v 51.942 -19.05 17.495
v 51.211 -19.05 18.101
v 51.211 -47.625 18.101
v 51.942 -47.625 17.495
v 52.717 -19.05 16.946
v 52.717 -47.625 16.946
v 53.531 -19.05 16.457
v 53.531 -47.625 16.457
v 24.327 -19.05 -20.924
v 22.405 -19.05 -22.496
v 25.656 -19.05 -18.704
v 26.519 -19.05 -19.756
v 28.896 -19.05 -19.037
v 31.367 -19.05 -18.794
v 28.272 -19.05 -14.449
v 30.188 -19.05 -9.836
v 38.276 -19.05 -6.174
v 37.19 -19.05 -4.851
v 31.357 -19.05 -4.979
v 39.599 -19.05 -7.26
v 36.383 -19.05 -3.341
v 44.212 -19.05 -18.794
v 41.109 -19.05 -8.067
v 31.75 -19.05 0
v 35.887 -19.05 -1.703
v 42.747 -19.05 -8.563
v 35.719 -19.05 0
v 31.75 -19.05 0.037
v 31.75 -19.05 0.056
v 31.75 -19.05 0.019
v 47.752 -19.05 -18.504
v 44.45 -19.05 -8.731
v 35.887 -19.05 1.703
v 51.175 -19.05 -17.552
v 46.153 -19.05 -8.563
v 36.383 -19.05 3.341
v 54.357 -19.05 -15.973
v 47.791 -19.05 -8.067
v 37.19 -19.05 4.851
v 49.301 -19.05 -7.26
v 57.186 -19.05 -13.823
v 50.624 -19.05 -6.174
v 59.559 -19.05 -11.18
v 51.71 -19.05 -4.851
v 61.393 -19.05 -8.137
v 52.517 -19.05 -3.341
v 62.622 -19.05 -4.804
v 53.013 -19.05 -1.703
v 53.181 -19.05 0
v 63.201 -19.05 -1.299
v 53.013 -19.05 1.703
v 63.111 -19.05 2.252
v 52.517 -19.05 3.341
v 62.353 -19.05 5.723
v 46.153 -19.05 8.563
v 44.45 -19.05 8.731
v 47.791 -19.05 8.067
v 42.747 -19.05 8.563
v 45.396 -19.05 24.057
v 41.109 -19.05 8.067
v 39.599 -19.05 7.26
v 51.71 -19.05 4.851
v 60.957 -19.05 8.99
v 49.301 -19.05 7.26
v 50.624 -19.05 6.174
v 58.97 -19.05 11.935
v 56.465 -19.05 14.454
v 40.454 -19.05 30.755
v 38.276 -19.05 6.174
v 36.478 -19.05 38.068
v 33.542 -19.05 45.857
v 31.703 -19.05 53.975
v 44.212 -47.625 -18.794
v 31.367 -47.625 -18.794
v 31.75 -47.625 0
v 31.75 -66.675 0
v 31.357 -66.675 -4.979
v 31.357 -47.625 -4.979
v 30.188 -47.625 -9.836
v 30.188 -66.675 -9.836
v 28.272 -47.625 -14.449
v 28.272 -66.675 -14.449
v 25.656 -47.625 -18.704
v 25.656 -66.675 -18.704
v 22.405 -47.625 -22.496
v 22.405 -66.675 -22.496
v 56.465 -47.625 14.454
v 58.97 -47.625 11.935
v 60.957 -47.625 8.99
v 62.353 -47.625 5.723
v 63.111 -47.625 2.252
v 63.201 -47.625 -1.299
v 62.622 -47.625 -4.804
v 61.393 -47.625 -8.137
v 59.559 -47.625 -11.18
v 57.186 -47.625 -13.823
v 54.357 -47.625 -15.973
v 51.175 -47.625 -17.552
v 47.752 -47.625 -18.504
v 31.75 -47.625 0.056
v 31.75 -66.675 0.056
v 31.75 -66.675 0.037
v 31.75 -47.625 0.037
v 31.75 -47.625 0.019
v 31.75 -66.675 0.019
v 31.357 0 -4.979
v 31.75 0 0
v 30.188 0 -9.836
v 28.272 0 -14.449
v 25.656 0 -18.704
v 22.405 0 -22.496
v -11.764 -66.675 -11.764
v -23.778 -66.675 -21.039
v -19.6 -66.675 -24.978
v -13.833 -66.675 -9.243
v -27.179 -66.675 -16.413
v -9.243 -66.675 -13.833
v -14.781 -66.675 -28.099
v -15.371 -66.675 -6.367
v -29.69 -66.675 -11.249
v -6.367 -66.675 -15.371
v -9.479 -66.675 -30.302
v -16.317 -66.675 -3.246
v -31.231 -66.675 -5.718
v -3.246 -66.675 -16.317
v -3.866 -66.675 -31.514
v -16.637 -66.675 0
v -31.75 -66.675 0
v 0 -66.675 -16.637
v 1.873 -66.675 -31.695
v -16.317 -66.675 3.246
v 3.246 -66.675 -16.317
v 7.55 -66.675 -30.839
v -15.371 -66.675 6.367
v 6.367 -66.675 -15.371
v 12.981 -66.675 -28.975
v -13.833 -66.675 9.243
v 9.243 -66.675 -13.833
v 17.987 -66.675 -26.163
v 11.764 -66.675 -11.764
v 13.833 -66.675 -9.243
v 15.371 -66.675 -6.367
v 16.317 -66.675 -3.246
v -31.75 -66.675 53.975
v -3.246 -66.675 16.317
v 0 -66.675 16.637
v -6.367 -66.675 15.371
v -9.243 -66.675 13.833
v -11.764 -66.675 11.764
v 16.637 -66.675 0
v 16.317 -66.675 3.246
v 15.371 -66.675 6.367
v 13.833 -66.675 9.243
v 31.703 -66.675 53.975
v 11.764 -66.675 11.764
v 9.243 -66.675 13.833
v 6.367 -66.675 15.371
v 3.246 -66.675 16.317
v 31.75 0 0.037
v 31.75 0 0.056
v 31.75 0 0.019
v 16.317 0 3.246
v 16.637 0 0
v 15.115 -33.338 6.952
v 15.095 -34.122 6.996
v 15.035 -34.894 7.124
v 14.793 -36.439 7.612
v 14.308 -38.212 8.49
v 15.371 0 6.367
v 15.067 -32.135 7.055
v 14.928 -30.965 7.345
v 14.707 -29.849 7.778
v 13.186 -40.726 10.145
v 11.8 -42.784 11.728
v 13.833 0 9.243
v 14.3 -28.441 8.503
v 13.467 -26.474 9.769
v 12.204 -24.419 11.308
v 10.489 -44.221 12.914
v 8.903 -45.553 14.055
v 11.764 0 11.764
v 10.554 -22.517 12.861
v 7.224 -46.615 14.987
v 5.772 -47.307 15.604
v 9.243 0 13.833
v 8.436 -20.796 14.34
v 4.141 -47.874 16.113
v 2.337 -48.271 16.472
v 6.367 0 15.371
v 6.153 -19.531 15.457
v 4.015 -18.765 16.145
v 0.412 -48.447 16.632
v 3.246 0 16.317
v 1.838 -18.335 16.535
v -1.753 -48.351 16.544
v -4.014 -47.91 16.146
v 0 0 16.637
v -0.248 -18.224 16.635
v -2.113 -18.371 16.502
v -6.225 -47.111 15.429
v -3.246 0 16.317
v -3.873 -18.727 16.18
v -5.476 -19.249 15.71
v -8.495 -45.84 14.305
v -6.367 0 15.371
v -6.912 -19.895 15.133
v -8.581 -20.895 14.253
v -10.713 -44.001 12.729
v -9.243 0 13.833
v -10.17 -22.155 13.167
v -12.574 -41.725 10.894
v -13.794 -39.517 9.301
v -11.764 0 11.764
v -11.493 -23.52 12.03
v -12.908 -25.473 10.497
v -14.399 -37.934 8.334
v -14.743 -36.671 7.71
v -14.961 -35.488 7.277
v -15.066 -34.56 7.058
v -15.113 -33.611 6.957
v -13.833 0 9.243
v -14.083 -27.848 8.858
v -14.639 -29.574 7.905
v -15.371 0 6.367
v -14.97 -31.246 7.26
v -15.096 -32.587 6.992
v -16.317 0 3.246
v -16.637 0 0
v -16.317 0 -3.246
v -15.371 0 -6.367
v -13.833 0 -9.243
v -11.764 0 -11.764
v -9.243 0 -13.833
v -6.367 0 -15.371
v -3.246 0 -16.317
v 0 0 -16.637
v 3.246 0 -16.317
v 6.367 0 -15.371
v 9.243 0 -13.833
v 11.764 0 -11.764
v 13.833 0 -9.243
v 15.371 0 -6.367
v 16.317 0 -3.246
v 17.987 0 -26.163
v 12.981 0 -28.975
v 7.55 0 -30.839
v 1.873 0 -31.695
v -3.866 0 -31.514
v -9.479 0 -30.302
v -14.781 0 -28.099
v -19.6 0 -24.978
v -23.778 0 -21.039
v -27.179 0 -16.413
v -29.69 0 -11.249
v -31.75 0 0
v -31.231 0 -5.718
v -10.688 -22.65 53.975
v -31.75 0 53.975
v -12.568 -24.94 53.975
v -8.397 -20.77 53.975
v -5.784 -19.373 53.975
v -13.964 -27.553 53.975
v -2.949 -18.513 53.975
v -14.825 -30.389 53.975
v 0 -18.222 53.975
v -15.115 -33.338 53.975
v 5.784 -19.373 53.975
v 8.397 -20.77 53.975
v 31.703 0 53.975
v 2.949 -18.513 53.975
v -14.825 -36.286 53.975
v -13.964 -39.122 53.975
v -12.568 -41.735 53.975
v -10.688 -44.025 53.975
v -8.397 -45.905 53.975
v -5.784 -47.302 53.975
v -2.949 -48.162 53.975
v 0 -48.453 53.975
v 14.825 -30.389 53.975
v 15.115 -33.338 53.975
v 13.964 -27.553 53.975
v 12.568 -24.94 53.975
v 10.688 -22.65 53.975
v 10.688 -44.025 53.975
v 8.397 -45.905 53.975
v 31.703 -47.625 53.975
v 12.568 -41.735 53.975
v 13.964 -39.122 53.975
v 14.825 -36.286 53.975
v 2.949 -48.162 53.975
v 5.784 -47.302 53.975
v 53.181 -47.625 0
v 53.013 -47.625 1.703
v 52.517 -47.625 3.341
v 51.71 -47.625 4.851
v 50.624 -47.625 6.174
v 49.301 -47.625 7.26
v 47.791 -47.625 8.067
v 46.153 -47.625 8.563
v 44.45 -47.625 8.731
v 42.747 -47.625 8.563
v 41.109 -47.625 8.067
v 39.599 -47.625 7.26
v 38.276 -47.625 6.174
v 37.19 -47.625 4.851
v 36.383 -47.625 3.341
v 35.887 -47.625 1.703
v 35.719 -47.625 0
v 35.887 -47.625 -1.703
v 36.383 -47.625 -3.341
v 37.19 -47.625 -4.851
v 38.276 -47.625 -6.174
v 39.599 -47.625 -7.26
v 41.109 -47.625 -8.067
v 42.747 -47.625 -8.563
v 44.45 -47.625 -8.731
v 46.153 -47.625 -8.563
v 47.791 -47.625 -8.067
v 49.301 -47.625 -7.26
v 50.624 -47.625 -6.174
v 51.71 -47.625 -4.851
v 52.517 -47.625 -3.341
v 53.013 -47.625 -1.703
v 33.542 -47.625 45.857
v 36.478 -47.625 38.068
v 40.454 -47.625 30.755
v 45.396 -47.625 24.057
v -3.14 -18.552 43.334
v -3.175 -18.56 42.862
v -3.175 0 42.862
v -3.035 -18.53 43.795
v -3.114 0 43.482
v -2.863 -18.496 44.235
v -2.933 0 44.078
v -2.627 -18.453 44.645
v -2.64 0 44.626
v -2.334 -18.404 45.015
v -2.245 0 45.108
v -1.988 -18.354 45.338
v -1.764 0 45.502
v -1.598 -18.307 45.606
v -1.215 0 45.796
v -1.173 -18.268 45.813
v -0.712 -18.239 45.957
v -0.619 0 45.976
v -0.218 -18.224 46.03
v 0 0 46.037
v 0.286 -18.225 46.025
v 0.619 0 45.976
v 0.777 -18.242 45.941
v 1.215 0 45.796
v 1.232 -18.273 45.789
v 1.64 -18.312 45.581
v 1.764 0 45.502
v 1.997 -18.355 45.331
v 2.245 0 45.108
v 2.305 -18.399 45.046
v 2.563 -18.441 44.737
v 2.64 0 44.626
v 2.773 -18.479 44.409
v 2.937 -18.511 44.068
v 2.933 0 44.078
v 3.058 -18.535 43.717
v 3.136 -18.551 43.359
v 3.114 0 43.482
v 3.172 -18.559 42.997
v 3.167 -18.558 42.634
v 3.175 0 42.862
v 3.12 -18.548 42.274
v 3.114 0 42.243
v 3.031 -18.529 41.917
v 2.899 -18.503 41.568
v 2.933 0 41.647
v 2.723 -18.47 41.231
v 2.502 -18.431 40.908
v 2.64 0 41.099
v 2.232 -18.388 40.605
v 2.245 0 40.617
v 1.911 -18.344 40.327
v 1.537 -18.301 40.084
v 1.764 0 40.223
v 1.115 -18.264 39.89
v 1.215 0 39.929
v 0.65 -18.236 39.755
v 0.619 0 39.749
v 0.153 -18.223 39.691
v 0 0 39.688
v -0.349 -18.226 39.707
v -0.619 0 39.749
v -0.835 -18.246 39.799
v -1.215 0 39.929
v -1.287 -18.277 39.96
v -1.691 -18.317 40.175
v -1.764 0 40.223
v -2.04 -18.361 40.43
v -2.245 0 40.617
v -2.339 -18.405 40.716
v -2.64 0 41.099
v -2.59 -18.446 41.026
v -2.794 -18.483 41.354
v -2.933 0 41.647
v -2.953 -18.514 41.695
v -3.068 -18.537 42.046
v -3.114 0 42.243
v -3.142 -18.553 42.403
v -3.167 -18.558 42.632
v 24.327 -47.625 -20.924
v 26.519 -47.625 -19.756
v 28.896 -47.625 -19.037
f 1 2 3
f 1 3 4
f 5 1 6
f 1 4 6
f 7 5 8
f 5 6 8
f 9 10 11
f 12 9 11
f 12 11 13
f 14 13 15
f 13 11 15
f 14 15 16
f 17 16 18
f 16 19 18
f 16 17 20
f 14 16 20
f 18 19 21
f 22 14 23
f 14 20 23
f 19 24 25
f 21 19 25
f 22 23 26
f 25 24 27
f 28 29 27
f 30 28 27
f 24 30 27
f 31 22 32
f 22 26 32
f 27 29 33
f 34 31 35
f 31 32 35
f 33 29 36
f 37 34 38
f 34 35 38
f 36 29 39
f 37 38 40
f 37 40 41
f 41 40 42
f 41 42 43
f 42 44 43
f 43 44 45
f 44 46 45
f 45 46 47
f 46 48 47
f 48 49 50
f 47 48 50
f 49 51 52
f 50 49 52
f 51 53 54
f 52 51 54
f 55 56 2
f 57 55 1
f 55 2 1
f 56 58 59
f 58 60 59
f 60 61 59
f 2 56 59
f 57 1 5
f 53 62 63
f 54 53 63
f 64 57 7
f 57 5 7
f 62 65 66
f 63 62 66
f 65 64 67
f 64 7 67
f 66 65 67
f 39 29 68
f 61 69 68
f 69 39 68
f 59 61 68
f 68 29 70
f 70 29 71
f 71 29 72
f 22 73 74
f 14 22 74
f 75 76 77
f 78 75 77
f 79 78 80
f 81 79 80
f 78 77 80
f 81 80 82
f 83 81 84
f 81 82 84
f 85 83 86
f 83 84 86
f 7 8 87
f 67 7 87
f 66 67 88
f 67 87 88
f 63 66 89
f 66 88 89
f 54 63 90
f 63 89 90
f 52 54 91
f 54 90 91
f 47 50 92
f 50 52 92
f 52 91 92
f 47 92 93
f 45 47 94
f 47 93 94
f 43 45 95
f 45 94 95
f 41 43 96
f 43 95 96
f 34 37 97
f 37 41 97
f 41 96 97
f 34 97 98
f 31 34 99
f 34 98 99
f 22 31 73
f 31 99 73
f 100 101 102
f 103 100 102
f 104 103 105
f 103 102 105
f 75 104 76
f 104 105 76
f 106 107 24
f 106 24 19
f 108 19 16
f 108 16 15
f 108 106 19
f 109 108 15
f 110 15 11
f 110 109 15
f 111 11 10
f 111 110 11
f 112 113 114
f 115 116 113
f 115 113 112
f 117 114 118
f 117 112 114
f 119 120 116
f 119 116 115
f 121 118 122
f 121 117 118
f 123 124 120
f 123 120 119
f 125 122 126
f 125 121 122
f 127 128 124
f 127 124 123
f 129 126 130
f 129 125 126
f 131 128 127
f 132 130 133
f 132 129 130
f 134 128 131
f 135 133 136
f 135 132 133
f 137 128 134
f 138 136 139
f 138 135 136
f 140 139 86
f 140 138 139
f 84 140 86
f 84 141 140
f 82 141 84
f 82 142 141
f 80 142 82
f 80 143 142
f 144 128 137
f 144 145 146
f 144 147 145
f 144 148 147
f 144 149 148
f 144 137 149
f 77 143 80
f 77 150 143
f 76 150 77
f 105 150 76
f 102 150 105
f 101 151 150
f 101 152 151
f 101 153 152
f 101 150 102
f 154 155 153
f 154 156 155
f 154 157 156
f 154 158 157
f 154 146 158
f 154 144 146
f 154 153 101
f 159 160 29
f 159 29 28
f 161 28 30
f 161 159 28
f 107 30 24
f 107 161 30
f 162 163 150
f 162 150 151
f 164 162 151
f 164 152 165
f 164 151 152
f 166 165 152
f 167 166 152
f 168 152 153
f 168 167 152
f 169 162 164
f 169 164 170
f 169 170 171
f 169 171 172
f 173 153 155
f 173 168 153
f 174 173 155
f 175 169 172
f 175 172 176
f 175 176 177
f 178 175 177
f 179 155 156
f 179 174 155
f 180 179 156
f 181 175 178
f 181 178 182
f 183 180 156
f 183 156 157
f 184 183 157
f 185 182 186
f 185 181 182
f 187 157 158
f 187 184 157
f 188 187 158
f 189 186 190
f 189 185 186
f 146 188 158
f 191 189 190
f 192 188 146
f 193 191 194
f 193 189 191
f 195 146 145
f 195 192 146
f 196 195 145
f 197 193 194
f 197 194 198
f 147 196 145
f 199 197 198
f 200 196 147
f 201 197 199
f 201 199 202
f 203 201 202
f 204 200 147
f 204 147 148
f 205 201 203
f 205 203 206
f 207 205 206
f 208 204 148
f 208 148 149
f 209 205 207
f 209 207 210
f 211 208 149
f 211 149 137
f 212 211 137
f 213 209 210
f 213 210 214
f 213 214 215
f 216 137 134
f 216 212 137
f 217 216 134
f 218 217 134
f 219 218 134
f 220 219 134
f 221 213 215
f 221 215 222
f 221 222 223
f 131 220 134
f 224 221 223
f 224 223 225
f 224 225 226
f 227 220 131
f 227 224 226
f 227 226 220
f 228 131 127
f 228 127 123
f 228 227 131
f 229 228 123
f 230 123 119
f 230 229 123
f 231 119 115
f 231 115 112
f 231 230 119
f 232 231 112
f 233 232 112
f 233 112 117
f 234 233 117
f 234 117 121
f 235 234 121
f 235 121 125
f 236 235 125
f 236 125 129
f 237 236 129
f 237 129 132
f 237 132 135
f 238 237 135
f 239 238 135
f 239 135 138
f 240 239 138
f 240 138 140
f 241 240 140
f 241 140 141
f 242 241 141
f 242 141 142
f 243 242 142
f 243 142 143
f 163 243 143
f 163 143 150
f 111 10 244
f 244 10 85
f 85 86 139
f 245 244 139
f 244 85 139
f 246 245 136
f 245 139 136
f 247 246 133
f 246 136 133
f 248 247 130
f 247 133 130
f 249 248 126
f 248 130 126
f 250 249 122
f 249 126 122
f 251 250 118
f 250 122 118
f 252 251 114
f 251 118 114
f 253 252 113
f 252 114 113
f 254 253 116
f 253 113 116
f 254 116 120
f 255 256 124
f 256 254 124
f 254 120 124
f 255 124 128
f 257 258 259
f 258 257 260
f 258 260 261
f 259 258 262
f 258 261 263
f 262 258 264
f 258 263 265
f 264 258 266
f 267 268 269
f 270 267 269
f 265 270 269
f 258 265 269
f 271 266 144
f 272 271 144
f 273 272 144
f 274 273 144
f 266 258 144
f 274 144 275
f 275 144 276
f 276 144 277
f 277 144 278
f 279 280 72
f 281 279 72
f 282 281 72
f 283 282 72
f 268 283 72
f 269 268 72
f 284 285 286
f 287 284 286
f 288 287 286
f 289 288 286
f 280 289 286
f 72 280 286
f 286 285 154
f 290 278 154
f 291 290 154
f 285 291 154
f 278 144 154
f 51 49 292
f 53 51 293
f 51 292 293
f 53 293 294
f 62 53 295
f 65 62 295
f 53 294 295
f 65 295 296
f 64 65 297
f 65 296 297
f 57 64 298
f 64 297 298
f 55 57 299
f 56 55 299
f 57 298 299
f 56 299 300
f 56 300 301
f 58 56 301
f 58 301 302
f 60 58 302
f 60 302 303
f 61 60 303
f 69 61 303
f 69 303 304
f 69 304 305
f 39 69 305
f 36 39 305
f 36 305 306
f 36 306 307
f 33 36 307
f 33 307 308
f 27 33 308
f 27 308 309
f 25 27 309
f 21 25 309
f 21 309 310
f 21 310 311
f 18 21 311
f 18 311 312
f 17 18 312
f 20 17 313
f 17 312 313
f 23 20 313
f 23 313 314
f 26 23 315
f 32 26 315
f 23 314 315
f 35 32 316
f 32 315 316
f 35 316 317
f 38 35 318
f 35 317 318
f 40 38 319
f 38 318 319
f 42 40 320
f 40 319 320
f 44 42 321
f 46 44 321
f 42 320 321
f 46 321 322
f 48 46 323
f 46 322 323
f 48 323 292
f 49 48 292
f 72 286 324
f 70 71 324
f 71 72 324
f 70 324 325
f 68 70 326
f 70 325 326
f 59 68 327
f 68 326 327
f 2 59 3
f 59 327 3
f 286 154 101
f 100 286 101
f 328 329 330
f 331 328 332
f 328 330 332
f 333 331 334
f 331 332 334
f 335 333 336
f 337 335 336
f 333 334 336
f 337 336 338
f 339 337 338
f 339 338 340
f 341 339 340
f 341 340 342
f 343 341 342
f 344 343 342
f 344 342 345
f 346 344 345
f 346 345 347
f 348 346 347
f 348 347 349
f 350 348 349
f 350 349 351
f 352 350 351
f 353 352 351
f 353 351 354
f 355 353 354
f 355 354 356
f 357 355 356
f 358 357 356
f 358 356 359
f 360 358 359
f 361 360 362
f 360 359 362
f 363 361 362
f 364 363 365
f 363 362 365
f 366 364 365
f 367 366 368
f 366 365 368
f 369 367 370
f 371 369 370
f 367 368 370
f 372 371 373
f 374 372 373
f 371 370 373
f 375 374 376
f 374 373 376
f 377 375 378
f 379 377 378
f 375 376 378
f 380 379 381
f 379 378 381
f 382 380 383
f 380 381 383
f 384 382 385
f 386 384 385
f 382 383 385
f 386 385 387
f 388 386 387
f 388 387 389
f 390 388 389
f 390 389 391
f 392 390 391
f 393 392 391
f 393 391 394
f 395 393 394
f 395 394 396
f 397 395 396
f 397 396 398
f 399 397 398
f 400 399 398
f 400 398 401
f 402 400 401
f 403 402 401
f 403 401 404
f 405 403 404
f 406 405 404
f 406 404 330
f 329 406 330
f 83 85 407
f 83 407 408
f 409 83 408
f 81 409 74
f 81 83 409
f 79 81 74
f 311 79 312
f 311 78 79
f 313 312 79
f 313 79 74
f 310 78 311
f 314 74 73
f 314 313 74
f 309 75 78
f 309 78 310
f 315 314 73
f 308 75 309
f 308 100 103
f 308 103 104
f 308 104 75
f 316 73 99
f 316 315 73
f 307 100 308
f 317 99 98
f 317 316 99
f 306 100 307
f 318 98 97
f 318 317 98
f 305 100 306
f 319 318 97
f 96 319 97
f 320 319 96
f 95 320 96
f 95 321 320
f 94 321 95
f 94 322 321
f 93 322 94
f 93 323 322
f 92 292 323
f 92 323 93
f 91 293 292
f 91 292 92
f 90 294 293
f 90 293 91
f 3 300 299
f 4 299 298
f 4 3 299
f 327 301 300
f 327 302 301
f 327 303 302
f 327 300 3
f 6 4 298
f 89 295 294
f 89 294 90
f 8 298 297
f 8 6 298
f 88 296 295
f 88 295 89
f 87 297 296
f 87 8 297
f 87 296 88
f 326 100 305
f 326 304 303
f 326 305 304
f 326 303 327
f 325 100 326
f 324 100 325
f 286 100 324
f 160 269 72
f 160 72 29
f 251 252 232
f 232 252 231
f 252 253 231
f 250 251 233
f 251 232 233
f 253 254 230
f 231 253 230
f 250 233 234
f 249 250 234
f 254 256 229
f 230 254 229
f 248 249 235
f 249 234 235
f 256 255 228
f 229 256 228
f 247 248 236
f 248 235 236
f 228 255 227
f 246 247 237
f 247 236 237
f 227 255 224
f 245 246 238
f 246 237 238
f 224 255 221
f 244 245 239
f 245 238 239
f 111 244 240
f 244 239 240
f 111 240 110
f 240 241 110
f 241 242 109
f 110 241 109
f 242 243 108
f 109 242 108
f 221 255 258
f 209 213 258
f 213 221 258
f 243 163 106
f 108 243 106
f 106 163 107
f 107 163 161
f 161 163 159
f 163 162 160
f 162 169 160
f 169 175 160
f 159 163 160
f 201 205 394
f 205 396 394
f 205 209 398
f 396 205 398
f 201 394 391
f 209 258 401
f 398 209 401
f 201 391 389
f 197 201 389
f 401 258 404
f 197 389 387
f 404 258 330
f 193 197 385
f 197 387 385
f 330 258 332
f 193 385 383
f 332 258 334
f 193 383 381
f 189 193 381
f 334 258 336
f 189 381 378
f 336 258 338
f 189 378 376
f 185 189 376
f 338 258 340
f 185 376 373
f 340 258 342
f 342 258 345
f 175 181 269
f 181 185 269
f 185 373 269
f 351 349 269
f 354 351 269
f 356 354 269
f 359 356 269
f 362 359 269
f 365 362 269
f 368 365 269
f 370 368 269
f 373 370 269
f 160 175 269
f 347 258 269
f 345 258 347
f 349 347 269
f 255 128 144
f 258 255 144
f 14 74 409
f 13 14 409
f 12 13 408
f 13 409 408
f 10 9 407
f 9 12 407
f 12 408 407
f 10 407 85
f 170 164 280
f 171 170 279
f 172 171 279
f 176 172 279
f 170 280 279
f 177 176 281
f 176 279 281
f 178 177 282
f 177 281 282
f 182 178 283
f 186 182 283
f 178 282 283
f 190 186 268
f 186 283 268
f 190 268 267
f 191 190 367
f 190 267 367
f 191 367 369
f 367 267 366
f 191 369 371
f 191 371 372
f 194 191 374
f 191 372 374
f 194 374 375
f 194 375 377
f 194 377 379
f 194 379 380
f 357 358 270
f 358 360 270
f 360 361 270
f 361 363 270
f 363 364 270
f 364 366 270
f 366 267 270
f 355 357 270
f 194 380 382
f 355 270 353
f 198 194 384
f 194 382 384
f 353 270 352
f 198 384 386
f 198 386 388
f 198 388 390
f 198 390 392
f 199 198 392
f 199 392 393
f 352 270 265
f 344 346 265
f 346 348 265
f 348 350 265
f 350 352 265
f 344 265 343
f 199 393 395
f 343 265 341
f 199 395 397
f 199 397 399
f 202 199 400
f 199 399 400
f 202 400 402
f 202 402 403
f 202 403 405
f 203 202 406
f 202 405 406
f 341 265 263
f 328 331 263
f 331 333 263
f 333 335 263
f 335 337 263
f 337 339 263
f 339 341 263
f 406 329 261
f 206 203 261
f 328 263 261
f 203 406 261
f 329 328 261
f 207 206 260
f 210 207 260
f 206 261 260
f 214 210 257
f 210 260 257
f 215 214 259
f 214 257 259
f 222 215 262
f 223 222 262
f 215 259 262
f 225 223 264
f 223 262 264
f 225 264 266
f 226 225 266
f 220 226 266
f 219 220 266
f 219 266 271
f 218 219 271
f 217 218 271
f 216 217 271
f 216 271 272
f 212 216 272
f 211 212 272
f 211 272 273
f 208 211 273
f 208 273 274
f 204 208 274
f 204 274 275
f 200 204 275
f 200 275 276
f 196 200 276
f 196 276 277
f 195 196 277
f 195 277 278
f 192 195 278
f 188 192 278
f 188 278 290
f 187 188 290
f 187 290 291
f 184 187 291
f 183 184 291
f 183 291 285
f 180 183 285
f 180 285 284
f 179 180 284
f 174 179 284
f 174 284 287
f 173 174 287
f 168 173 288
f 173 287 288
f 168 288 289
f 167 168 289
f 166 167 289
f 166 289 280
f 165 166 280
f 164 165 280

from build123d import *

# Parameters (mm, degrees)
F0_R      = 63.5
F0_R_2    = 16.637
F1_DEPTH  = 66.675
F2_R      = 63.5
F2_R_2    = 8.73125
F3_DEPTH  = 66.676
F4_R      = 8.73125
F5_DEPTH  = 19.05
F7_R      = 15.1150654982
F8_DEPTH  = 53.594
F9_R      = 3.175
F10_DEPTH = 25.4


# Not quite as in the source:
# - a pattern or mirror of a feature is missing from the dataset's text; its kind, count and spacing are read off the source's solid


with BuildPart() as f1:
    # F0 (on Front) → F1 (new body)
    with BuildSketch(Plane.XZ):
        Circle(F0_R)
        Circle(F0_R_2, mode=Mode.SUBTRACT)
    extrude(amount=F1_DEPTH)

    # F2 (on face) → F3 (cut, through all)
    with BuildSketch(Plane.XZ.offset(66.675)):
        Circle(F2_R)
        with BuildLine():
            Line((-31.75, 0), (-31.75, 53.975))
            Line((-31.75, 53.975), (31.7028198831, 53.975))
            ThreePointArc((31.7028198831, 53.975), (38.3398958316, 34.3431316591), (51.2105212065, 18.1009632644))
            ThreePointArc((51.2105212065, 18.1009632644), (52.3246389461, 17.2136710516), (53.5311013852, 16.4567072537))
            ThreePointArc((53.5311013852, 16.4567072537), (62.6217032006, -4.8040419219), (44.2117641598, -18.7944901416))
            Line((44.2117641598, -18.7944901416), (31.3671737764, -18.7944901416))
            ThreePointArc((31.3671737764, -18.7944901416), (26.5189786011, -19.756304441), (22.405124126, -22.4960643869))
            ThreePointArc((22.405124126, -22.4960643869), (-12.179897557, -29.3208559817), (-31.75, 0))
        make_face(mode=Mode.SUBTRACT)
        with Locations((44.45, 0)):
            Circle(F2_R_2)
    extrude(amount=-F3_DEPTH, mode=Mode.SUBTRACT)

    # F4 (on face) → F5 (cut)
    with BuildSketch(Plane.XZ.offset(66.675)):
        with BuildLine():
            Line((31.3671737764, -18.7944901416), (44.2117641598, -18.7944901416))
            ThreePointArc((44.2117641598, -18.7944901416), (62.6217032006, -4.8040419219), (53.5311013852, 16.4567072537))
            ThreePointArc((53.5311013852, 16.4567072537), (52.3246389461, 17.2136710516), (51.2105212065, 18.1009632644))
            ThreePointArc((51.2105212065, 18.1009632644), (38.3398958316, 34.3431316591), (31.7028198831, 53.975))
            Line((31.7028198831, 53.975), (31.7499514816, 0.0555059775))
            ThreePointArc((31.7499514816, 0.0555059775), (31.7499878704, 0.0277529994), (31.75, 0))
            ThreePointArc((31.75, 0), (29.3208559817, -12.179897557), (22.405124126, -22.4960643869))
            ThreePointArc((22.405124126, -22.4960643869), (26.5189786011, -19.756304441), (31.3671737764, -18.7944901416))
        make_face()
        with Locations((44.45, 0)):
            Circle(F4_R, mode=Mode.SUBTRACT)
    f5 = extrude(amount=-F5_DEPTH, mode=Mode.SUBTRACT)

    # F5_copies: F5 across plane
    add(f5.mirror(Plane.ZX.offset(-33.3375)), mode=Mode.SUBTRACT)

    # F7 (on face) → F8 (cut)
    with BuildSketch(Plane.XY.offset(53.975)):
        with Locations((0, -33.3375)):
            Circle(F7_R)
    extrude(amount=-F8_DEPTH, mode=Mode.SUBTRACT)

    # F9 (on face) → F10 (cut)
    with BuildSketch(Plane(origin=(0, 0, 0), x_dir=(-1, 0, 0), z_dir=(0, 1, 0))):
        with Locations((0, 42.8625)):
            Circle(F9_R)
    extrude(amount=-F10_DEPTH, mode=Mode.SUBTRACT)


solid = f1.part
